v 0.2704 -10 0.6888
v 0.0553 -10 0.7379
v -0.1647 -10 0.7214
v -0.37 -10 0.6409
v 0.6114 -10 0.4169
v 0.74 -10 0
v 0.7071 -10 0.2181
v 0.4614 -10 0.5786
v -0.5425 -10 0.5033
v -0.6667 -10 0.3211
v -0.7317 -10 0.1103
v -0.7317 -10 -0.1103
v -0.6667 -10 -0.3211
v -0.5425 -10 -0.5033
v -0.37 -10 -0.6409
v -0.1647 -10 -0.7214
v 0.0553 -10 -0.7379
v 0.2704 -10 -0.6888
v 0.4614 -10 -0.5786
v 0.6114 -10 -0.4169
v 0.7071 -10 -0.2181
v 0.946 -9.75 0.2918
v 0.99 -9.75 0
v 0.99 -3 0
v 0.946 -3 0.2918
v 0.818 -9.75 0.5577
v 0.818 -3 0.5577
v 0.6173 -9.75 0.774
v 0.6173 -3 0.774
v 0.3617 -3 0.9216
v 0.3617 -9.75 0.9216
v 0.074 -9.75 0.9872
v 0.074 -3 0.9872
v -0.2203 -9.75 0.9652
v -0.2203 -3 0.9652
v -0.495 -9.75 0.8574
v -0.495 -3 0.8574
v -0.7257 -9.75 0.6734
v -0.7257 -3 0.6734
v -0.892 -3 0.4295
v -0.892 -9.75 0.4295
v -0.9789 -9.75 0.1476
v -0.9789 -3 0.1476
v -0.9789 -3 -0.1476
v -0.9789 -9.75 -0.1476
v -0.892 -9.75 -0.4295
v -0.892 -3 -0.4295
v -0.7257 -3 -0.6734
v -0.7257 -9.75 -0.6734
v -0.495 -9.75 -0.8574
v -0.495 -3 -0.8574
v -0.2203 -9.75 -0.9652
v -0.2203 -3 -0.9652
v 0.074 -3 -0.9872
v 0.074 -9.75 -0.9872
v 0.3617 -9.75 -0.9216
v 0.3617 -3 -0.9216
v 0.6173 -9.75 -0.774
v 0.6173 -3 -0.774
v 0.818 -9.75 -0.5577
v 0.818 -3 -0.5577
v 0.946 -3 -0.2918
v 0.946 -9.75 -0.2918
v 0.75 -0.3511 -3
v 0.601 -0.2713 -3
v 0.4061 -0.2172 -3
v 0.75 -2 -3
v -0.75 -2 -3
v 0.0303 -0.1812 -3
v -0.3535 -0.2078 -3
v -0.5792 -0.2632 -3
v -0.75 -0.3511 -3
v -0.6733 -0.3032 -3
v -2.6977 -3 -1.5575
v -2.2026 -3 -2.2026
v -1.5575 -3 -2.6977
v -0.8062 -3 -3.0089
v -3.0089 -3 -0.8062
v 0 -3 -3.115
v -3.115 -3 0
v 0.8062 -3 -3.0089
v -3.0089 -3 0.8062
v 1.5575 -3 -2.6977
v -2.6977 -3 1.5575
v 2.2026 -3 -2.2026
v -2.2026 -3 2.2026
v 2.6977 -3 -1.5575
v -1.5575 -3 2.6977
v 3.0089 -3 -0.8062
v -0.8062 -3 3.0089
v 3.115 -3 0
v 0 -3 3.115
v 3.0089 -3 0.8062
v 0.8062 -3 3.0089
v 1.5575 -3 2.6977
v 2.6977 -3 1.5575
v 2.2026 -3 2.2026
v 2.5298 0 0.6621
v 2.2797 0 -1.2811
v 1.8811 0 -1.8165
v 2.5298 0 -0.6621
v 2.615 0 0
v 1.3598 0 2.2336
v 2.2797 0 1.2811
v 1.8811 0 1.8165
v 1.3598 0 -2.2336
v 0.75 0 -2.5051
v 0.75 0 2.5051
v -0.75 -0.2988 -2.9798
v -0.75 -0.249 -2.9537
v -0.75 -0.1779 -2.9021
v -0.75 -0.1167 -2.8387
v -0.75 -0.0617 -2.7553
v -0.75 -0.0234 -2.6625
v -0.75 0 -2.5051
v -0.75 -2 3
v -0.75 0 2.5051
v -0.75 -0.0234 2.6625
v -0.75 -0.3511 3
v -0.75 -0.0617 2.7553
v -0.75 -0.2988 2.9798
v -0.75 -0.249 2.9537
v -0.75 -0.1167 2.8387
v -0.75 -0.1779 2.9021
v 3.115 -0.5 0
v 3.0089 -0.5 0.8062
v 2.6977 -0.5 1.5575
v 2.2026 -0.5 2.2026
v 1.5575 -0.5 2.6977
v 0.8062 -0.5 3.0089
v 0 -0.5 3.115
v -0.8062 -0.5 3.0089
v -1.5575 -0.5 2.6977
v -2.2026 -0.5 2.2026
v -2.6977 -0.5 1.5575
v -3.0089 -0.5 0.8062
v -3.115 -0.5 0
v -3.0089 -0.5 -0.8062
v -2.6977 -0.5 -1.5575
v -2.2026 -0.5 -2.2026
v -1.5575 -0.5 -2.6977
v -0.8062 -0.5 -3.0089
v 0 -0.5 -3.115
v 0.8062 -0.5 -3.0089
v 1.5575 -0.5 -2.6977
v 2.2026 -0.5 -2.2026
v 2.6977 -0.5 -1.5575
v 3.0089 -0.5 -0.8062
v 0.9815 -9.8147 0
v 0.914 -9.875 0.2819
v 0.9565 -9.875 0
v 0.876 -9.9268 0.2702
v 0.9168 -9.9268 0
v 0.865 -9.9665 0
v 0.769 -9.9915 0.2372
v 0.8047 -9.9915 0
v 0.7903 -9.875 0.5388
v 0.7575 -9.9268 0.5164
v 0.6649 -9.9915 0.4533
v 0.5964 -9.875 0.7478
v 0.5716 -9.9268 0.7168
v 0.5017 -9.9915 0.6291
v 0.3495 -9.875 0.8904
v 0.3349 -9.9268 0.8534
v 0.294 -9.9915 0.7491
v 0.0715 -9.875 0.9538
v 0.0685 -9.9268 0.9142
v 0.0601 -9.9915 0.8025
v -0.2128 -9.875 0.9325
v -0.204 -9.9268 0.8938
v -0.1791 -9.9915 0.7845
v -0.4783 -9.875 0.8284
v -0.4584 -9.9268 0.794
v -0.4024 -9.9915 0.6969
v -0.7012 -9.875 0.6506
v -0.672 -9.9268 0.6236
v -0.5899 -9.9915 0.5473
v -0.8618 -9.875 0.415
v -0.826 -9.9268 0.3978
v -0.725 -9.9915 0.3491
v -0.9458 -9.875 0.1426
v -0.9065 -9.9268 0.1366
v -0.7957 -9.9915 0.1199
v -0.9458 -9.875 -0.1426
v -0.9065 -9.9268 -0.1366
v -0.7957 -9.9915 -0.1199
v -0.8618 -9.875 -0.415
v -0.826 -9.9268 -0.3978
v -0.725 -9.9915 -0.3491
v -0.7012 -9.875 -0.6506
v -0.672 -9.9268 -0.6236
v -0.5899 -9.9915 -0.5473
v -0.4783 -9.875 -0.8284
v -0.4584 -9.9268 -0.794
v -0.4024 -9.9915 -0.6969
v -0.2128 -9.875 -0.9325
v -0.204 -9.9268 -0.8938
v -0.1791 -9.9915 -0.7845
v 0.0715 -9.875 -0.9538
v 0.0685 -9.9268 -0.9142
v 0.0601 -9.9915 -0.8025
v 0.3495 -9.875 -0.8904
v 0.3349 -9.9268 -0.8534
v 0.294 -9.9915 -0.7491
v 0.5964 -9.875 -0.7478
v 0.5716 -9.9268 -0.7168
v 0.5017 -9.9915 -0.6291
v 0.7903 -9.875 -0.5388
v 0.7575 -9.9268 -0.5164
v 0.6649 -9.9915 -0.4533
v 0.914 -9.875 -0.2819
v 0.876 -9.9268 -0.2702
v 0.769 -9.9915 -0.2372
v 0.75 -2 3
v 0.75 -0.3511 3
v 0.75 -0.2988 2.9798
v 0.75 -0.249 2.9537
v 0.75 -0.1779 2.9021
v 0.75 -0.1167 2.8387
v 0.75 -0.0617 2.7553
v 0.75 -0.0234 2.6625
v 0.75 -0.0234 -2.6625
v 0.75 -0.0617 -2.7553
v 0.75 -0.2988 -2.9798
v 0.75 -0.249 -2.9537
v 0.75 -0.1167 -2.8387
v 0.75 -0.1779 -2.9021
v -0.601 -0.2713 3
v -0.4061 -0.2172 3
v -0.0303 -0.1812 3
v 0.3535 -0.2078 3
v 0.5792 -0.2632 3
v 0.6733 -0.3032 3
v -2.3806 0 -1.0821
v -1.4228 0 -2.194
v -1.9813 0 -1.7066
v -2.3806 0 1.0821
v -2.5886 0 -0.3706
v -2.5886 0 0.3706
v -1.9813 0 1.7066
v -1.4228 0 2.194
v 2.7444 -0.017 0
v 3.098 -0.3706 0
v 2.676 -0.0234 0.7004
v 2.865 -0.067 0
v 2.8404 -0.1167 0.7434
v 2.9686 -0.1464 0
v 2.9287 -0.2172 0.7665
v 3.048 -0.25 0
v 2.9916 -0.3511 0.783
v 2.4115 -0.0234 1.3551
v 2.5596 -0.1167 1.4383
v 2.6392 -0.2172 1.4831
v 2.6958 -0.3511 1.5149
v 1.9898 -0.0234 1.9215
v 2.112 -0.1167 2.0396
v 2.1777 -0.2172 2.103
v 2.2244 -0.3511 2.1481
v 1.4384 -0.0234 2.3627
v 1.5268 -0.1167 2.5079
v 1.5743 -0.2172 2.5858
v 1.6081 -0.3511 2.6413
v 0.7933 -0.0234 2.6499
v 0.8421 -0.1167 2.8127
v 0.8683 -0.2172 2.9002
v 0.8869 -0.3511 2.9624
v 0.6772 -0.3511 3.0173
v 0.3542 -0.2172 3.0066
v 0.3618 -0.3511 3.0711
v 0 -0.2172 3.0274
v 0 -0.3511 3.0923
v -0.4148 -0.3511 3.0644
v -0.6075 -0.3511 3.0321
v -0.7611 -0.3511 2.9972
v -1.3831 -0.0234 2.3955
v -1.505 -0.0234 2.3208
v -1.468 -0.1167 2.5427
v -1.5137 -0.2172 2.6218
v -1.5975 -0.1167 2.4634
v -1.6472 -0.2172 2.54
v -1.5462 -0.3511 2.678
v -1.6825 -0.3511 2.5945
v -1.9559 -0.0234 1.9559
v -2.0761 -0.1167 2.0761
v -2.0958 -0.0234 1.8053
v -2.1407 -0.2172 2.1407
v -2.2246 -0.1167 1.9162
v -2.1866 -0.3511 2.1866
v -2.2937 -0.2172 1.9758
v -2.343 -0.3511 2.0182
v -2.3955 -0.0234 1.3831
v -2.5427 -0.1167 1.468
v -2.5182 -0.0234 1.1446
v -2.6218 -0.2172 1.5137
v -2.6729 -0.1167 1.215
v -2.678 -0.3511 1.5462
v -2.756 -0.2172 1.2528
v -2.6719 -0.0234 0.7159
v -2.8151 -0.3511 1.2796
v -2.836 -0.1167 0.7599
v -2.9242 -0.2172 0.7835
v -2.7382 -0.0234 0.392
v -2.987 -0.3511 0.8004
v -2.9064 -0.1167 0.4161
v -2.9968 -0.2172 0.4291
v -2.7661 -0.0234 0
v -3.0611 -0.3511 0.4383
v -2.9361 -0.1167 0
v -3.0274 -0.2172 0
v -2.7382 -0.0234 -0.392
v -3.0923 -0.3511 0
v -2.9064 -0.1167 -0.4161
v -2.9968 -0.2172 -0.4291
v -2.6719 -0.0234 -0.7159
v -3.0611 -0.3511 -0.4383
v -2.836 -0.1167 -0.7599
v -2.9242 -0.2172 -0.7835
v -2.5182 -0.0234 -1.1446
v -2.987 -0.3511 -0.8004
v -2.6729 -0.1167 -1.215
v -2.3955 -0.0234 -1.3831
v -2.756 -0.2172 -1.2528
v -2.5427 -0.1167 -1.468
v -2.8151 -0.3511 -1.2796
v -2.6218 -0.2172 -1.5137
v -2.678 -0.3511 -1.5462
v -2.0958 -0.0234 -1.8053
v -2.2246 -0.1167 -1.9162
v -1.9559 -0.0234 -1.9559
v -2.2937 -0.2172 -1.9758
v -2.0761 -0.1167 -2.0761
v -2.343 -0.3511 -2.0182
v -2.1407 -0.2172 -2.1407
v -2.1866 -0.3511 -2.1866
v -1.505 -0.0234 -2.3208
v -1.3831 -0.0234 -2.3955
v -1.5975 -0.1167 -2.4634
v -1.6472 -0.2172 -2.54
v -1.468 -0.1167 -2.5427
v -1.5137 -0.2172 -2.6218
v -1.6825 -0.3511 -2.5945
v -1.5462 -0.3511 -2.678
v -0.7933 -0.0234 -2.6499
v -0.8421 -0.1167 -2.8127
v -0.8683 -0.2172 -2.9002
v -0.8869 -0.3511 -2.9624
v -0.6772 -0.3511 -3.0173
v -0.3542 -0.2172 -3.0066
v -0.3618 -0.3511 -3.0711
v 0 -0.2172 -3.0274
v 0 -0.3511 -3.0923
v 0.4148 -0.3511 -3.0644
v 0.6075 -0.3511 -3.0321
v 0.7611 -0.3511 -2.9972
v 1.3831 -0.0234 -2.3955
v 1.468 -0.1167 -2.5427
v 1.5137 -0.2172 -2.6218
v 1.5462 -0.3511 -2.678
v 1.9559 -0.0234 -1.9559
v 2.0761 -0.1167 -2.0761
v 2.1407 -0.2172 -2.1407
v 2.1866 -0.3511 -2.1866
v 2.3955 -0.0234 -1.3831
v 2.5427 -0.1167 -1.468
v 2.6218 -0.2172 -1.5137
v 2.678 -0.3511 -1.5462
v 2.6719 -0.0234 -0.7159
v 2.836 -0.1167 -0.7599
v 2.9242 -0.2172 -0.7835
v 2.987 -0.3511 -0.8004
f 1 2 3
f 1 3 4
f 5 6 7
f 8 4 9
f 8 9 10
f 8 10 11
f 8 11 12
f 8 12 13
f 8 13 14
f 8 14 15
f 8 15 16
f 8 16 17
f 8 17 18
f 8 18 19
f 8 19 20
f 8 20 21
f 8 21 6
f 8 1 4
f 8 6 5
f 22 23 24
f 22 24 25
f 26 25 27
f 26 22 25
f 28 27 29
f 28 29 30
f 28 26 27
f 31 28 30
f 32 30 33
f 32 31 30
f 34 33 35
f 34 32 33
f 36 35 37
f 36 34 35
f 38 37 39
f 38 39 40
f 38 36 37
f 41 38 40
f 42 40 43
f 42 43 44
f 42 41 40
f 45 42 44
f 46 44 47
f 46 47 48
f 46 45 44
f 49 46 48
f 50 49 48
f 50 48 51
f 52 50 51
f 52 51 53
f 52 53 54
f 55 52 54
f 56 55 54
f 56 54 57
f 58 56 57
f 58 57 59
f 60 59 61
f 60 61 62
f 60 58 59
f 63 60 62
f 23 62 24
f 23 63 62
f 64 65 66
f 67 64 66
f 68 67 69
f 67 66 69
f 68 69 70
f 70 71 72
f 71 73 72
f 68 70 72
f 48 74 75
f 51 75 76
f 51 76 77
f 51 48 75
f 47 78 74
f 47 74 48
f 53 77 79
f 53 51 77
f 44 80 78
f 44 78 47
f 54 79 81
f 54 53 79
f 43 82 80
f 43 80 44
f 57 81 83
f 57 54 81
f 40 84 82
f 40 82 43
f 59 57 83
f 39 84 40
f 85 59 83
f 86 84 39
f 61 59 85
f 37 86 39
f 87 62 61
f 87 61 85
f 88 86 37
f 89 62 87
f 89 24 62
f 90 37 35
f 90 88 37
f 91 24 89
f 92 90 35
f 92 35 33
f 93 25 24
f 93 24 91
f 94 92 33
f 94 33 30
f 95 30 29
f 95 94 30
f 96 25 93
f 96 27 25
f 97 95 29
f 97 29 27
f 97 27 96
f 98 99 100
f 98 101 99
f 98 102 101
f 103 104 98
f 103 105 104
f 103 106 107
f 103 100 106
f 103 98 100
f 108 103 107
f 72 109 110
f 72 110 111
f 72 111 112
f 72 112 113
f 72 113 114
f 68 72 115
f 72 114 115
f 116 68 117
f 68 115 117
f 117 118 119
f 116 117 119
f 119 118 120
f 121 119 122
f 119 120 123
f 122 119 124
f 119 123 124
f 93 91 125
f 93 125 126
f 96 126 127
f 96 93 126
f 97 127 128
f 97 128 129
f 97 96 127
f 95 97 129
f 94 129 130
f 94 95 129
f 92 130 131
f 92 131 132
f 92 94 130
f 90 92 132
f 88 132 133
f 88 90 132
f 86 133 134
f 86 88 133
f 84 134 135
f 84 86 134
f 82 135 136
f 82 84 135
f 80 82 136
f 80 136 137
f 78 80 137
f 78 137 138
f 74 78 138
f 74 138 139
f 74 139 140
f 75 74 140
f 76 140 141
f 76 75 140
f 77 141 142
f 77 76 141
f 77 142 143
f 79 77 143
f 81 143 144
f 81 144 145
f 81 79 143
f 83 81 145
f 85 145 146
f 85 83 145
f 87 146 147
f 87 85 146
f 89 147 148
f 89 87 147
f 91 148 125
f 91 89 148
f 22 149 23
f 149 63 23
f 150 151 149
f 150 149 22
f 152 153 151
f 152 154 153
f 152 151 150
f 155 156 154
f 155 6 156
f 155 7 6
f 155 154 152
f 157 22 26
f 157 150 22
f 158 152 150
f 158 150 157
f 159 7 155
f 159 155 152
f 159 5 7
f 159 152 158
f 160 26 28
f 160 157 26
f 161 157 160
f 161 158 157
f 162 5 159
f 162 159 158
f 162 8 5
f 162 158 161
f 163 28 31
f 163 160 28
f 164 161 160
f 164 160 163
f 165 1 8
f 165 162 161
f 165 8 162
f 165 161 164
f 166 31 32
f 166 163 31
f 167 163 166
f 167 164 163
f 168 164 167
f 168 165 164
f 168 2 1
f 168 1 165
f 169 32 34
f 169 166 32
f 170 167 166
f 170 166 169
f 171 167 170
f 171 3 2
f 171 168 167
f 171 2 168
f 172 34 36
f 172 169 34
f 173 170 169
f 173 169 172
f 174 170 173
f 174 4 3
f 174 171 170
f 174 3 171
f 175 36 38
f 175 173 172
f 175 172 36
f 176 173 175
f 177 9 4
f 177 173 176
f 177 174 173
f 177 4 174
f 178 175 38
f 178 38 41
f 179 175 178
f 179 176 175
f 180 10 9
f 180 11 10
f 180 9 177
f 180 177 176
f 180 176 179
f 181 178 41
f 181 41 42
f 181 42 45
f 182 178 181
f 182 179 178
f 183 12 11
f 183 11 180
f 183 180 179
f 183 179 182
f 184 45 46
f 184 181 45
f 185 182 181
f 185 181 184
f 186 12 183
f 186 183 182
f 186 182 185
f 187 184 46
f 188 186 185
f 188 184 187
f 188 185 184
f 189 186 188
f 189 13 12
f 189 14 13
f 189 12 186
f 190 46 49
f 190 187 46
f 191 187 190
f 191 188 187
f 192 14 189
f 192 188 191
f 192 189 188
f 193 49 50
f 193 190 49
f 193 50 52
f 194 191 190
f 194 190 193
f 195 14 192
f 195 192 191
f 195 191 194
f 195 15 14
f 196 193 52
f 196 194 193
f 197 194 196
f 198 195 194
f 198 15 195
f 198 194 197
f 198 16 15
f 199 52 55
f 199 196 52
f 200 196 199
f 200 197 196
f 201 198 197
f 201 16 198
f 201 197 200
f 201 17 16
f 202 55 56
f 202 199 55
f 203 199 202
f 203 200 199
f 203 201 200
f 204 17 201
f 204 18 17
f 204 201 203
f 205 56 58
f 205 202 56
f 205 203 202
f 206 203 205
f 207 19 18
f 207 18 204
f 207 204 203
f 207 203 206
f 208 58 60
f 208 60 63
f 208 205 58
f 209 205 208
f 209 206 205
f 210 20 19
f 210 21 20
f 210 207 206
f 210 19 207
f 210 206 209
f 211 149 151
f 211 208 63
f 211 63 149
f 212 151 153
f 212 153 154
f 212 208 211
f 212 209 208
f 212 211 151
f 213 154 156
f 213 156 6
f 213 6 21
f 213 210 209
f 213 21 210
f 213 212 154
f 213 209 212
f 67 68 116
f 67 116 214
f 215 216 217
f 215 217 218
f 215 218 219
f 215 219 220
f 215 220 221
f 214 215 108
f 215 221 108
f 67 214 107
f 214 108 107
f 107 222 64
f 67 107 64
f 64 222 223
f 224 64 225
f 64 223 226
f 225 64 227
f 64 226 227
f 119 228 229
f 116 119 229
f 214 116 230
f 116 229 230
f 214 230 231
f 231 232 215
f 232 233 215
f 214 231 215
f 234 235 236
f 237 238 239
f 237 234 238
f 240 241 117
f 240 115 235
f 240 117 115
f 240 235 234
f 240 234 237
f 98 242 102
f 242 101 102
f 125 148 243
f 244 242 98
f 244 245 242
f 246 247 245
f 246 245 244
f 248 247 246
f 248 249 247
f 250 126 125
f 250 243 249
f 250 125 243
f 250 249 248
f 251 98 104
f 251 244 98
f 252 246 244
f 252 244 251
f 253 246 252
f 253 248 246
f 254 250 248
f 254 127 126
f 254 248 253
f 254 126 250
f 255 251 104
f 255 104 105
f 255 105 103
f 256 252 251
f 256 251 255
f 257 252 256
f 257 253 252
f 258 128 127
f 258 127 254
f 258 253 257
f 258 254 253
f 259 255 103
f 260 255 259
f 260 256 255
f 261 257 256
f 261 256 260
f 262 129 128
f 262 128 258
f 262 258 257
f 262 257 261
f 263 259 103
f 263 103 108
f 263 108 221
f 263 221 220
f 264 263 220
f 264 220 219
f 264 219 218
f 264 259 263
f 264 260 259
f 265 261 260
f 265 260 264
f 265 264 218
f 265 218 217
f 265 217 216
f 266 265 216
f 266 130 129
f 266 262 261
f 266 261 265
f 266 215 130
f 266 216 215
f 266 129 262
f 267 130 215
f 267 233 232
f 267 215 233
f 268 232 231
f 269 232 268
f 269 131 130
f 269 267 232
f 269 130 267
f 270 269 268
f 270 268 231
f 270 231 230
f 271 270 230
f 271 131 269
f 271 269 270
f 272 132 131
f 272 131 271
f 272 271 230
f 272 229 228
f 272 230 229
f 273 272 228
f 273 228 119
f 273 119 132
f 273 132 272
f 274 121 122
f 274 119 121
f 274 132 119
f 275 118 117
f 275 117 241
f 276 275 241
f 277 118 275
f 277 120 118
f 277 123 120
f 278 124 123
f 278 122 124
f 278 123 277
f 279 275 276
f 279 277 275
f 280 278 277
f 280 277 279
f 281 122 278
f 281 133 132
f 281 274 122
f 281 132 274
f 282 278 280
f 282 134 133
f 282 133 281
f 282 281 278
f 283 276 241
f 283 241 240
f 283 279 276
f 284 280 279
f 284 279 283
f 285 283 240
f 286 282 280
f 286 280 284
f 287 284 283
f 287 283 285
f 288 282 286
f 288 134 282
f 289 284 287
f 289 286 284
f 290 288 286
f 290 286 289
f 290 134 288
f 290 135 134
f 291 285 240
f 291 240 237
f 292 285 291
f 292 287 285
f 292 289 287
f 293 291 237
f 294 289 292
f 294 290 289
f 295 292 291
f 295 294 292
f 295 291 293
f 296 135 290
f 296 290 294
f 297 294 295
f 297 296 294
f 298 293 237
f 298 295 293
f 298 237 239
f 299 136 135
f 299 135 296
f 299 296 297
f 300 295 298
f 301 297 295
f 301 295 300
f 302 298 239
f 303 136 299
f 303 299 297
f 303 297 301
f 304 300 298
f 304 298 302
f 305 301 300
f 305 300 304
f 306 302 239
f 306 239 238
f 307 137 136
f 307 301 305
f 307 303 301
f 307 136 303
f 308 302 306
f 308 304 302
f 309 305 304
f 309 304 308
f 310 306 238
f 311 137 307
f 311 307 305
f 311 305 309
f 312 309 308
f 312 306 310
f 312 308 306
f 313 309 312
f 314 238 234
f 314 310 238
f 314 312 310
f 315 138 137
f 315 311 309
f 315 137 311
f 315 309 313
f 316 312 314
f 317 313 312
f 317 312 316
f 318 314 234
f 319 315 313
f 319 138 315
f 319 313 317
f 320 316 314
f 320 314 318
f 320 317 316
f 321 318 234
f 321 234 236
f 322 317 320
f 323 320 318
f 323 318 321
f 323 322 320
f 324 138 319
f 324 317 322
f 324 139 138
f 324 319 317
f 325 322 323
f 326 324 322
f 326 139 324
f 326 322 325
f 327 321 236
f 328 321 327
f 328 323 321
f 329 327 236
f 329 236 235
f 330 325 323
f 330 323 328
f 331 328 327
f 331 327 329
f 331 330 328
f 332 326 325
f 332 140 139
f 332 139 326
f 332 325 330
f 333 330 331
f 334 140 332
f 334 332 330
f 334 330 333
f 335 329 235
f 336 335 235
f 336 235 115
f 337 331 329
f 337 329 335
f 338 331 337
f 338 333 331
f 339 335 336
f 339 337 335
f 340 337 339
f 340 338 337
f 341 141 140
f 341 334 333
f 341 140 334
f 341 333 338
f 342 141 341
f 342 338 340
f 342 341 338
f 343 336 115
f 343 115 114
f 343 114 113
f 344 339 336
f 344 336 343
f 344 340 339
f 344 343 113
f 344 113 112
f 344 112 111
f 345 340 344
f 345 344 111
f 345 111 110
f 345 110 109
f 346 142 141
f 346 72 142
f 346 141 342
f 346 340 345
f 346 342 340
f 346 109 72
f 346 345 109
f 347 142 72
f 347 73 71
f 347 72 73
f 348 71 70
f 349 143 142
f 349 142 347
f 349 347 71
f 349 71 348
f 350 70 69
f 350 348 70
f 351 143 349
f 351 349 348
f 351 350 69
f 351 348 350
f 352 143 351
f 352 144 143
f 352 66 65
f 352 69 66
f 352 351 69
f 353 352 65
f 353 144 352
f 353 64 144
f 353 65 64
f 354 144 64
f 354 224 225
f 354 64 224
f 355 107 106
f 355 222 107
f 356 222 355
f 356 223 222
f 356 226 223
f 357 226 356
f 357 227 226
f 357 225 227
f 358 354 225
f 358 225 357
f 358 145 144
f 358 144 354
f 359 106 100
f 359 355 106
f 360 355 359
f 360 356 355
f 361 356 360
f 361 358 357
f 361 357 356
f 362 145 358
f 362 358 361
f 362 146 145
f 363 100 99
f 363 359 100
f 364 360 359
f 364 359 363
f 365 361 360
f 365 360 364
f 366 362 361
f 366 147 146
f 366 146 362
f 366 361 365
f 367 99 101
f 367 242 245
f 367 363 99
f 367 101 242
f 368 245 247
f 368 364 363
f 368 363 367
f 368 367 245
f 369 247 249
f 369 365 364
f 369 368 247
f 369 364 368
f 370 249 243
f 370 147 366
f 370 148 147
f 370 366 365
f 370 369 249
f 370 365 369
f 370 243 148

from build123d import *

# Parameters (mm, degrees)
FILLET1_R          = 0.5
FILLET2_R          = 0.25
CUT_EXTRUDE1_DEPTH = 2


with BuildPart() as part:
    # Sketch2 → Revolve1 (revolve)
    with BuildSketch(Plane.XY):
        Polygon((0, 0), (3.115, 0), (3.115, -3), (0.99, -3), (0.99, -10), (0, -10), align=None)
    revolve(axis=Axis((0, 0, 0), (0, -1, 0)))

    # Fillet1
    fillet1_edges = [part.edges().sort_by_distance(p)[0] for p in [
        (-3.115, 0, 0),
    ]]
    fillet(fillet1_edges, radius=FILLET1_R)

    # Fillet2
    fillet2_edges = [part.edges().sort_by_distance(p)[0] for p in [
        (-0.99, -10, 0),
    ]]
    fillet(fillet2_edges, radius=FILLET2_R)

    # Sketch4 → Cut-Extrude1 (cut)
    with BuildSketch(Plane(origin=(0, 0, 0), x_dir=(1, 0, 0), z_dir=(0, 1, 0))):
        Polygon((0.75, -3), (0.75, 0.051459753), (0.75, 3), (-0.75, 3), (-0.75, -3), align=None)
    extrude(amount=-CUT_EXTRUDE1_DEPTH, mode=Mode.SUBTRACT)


solid = part.part
